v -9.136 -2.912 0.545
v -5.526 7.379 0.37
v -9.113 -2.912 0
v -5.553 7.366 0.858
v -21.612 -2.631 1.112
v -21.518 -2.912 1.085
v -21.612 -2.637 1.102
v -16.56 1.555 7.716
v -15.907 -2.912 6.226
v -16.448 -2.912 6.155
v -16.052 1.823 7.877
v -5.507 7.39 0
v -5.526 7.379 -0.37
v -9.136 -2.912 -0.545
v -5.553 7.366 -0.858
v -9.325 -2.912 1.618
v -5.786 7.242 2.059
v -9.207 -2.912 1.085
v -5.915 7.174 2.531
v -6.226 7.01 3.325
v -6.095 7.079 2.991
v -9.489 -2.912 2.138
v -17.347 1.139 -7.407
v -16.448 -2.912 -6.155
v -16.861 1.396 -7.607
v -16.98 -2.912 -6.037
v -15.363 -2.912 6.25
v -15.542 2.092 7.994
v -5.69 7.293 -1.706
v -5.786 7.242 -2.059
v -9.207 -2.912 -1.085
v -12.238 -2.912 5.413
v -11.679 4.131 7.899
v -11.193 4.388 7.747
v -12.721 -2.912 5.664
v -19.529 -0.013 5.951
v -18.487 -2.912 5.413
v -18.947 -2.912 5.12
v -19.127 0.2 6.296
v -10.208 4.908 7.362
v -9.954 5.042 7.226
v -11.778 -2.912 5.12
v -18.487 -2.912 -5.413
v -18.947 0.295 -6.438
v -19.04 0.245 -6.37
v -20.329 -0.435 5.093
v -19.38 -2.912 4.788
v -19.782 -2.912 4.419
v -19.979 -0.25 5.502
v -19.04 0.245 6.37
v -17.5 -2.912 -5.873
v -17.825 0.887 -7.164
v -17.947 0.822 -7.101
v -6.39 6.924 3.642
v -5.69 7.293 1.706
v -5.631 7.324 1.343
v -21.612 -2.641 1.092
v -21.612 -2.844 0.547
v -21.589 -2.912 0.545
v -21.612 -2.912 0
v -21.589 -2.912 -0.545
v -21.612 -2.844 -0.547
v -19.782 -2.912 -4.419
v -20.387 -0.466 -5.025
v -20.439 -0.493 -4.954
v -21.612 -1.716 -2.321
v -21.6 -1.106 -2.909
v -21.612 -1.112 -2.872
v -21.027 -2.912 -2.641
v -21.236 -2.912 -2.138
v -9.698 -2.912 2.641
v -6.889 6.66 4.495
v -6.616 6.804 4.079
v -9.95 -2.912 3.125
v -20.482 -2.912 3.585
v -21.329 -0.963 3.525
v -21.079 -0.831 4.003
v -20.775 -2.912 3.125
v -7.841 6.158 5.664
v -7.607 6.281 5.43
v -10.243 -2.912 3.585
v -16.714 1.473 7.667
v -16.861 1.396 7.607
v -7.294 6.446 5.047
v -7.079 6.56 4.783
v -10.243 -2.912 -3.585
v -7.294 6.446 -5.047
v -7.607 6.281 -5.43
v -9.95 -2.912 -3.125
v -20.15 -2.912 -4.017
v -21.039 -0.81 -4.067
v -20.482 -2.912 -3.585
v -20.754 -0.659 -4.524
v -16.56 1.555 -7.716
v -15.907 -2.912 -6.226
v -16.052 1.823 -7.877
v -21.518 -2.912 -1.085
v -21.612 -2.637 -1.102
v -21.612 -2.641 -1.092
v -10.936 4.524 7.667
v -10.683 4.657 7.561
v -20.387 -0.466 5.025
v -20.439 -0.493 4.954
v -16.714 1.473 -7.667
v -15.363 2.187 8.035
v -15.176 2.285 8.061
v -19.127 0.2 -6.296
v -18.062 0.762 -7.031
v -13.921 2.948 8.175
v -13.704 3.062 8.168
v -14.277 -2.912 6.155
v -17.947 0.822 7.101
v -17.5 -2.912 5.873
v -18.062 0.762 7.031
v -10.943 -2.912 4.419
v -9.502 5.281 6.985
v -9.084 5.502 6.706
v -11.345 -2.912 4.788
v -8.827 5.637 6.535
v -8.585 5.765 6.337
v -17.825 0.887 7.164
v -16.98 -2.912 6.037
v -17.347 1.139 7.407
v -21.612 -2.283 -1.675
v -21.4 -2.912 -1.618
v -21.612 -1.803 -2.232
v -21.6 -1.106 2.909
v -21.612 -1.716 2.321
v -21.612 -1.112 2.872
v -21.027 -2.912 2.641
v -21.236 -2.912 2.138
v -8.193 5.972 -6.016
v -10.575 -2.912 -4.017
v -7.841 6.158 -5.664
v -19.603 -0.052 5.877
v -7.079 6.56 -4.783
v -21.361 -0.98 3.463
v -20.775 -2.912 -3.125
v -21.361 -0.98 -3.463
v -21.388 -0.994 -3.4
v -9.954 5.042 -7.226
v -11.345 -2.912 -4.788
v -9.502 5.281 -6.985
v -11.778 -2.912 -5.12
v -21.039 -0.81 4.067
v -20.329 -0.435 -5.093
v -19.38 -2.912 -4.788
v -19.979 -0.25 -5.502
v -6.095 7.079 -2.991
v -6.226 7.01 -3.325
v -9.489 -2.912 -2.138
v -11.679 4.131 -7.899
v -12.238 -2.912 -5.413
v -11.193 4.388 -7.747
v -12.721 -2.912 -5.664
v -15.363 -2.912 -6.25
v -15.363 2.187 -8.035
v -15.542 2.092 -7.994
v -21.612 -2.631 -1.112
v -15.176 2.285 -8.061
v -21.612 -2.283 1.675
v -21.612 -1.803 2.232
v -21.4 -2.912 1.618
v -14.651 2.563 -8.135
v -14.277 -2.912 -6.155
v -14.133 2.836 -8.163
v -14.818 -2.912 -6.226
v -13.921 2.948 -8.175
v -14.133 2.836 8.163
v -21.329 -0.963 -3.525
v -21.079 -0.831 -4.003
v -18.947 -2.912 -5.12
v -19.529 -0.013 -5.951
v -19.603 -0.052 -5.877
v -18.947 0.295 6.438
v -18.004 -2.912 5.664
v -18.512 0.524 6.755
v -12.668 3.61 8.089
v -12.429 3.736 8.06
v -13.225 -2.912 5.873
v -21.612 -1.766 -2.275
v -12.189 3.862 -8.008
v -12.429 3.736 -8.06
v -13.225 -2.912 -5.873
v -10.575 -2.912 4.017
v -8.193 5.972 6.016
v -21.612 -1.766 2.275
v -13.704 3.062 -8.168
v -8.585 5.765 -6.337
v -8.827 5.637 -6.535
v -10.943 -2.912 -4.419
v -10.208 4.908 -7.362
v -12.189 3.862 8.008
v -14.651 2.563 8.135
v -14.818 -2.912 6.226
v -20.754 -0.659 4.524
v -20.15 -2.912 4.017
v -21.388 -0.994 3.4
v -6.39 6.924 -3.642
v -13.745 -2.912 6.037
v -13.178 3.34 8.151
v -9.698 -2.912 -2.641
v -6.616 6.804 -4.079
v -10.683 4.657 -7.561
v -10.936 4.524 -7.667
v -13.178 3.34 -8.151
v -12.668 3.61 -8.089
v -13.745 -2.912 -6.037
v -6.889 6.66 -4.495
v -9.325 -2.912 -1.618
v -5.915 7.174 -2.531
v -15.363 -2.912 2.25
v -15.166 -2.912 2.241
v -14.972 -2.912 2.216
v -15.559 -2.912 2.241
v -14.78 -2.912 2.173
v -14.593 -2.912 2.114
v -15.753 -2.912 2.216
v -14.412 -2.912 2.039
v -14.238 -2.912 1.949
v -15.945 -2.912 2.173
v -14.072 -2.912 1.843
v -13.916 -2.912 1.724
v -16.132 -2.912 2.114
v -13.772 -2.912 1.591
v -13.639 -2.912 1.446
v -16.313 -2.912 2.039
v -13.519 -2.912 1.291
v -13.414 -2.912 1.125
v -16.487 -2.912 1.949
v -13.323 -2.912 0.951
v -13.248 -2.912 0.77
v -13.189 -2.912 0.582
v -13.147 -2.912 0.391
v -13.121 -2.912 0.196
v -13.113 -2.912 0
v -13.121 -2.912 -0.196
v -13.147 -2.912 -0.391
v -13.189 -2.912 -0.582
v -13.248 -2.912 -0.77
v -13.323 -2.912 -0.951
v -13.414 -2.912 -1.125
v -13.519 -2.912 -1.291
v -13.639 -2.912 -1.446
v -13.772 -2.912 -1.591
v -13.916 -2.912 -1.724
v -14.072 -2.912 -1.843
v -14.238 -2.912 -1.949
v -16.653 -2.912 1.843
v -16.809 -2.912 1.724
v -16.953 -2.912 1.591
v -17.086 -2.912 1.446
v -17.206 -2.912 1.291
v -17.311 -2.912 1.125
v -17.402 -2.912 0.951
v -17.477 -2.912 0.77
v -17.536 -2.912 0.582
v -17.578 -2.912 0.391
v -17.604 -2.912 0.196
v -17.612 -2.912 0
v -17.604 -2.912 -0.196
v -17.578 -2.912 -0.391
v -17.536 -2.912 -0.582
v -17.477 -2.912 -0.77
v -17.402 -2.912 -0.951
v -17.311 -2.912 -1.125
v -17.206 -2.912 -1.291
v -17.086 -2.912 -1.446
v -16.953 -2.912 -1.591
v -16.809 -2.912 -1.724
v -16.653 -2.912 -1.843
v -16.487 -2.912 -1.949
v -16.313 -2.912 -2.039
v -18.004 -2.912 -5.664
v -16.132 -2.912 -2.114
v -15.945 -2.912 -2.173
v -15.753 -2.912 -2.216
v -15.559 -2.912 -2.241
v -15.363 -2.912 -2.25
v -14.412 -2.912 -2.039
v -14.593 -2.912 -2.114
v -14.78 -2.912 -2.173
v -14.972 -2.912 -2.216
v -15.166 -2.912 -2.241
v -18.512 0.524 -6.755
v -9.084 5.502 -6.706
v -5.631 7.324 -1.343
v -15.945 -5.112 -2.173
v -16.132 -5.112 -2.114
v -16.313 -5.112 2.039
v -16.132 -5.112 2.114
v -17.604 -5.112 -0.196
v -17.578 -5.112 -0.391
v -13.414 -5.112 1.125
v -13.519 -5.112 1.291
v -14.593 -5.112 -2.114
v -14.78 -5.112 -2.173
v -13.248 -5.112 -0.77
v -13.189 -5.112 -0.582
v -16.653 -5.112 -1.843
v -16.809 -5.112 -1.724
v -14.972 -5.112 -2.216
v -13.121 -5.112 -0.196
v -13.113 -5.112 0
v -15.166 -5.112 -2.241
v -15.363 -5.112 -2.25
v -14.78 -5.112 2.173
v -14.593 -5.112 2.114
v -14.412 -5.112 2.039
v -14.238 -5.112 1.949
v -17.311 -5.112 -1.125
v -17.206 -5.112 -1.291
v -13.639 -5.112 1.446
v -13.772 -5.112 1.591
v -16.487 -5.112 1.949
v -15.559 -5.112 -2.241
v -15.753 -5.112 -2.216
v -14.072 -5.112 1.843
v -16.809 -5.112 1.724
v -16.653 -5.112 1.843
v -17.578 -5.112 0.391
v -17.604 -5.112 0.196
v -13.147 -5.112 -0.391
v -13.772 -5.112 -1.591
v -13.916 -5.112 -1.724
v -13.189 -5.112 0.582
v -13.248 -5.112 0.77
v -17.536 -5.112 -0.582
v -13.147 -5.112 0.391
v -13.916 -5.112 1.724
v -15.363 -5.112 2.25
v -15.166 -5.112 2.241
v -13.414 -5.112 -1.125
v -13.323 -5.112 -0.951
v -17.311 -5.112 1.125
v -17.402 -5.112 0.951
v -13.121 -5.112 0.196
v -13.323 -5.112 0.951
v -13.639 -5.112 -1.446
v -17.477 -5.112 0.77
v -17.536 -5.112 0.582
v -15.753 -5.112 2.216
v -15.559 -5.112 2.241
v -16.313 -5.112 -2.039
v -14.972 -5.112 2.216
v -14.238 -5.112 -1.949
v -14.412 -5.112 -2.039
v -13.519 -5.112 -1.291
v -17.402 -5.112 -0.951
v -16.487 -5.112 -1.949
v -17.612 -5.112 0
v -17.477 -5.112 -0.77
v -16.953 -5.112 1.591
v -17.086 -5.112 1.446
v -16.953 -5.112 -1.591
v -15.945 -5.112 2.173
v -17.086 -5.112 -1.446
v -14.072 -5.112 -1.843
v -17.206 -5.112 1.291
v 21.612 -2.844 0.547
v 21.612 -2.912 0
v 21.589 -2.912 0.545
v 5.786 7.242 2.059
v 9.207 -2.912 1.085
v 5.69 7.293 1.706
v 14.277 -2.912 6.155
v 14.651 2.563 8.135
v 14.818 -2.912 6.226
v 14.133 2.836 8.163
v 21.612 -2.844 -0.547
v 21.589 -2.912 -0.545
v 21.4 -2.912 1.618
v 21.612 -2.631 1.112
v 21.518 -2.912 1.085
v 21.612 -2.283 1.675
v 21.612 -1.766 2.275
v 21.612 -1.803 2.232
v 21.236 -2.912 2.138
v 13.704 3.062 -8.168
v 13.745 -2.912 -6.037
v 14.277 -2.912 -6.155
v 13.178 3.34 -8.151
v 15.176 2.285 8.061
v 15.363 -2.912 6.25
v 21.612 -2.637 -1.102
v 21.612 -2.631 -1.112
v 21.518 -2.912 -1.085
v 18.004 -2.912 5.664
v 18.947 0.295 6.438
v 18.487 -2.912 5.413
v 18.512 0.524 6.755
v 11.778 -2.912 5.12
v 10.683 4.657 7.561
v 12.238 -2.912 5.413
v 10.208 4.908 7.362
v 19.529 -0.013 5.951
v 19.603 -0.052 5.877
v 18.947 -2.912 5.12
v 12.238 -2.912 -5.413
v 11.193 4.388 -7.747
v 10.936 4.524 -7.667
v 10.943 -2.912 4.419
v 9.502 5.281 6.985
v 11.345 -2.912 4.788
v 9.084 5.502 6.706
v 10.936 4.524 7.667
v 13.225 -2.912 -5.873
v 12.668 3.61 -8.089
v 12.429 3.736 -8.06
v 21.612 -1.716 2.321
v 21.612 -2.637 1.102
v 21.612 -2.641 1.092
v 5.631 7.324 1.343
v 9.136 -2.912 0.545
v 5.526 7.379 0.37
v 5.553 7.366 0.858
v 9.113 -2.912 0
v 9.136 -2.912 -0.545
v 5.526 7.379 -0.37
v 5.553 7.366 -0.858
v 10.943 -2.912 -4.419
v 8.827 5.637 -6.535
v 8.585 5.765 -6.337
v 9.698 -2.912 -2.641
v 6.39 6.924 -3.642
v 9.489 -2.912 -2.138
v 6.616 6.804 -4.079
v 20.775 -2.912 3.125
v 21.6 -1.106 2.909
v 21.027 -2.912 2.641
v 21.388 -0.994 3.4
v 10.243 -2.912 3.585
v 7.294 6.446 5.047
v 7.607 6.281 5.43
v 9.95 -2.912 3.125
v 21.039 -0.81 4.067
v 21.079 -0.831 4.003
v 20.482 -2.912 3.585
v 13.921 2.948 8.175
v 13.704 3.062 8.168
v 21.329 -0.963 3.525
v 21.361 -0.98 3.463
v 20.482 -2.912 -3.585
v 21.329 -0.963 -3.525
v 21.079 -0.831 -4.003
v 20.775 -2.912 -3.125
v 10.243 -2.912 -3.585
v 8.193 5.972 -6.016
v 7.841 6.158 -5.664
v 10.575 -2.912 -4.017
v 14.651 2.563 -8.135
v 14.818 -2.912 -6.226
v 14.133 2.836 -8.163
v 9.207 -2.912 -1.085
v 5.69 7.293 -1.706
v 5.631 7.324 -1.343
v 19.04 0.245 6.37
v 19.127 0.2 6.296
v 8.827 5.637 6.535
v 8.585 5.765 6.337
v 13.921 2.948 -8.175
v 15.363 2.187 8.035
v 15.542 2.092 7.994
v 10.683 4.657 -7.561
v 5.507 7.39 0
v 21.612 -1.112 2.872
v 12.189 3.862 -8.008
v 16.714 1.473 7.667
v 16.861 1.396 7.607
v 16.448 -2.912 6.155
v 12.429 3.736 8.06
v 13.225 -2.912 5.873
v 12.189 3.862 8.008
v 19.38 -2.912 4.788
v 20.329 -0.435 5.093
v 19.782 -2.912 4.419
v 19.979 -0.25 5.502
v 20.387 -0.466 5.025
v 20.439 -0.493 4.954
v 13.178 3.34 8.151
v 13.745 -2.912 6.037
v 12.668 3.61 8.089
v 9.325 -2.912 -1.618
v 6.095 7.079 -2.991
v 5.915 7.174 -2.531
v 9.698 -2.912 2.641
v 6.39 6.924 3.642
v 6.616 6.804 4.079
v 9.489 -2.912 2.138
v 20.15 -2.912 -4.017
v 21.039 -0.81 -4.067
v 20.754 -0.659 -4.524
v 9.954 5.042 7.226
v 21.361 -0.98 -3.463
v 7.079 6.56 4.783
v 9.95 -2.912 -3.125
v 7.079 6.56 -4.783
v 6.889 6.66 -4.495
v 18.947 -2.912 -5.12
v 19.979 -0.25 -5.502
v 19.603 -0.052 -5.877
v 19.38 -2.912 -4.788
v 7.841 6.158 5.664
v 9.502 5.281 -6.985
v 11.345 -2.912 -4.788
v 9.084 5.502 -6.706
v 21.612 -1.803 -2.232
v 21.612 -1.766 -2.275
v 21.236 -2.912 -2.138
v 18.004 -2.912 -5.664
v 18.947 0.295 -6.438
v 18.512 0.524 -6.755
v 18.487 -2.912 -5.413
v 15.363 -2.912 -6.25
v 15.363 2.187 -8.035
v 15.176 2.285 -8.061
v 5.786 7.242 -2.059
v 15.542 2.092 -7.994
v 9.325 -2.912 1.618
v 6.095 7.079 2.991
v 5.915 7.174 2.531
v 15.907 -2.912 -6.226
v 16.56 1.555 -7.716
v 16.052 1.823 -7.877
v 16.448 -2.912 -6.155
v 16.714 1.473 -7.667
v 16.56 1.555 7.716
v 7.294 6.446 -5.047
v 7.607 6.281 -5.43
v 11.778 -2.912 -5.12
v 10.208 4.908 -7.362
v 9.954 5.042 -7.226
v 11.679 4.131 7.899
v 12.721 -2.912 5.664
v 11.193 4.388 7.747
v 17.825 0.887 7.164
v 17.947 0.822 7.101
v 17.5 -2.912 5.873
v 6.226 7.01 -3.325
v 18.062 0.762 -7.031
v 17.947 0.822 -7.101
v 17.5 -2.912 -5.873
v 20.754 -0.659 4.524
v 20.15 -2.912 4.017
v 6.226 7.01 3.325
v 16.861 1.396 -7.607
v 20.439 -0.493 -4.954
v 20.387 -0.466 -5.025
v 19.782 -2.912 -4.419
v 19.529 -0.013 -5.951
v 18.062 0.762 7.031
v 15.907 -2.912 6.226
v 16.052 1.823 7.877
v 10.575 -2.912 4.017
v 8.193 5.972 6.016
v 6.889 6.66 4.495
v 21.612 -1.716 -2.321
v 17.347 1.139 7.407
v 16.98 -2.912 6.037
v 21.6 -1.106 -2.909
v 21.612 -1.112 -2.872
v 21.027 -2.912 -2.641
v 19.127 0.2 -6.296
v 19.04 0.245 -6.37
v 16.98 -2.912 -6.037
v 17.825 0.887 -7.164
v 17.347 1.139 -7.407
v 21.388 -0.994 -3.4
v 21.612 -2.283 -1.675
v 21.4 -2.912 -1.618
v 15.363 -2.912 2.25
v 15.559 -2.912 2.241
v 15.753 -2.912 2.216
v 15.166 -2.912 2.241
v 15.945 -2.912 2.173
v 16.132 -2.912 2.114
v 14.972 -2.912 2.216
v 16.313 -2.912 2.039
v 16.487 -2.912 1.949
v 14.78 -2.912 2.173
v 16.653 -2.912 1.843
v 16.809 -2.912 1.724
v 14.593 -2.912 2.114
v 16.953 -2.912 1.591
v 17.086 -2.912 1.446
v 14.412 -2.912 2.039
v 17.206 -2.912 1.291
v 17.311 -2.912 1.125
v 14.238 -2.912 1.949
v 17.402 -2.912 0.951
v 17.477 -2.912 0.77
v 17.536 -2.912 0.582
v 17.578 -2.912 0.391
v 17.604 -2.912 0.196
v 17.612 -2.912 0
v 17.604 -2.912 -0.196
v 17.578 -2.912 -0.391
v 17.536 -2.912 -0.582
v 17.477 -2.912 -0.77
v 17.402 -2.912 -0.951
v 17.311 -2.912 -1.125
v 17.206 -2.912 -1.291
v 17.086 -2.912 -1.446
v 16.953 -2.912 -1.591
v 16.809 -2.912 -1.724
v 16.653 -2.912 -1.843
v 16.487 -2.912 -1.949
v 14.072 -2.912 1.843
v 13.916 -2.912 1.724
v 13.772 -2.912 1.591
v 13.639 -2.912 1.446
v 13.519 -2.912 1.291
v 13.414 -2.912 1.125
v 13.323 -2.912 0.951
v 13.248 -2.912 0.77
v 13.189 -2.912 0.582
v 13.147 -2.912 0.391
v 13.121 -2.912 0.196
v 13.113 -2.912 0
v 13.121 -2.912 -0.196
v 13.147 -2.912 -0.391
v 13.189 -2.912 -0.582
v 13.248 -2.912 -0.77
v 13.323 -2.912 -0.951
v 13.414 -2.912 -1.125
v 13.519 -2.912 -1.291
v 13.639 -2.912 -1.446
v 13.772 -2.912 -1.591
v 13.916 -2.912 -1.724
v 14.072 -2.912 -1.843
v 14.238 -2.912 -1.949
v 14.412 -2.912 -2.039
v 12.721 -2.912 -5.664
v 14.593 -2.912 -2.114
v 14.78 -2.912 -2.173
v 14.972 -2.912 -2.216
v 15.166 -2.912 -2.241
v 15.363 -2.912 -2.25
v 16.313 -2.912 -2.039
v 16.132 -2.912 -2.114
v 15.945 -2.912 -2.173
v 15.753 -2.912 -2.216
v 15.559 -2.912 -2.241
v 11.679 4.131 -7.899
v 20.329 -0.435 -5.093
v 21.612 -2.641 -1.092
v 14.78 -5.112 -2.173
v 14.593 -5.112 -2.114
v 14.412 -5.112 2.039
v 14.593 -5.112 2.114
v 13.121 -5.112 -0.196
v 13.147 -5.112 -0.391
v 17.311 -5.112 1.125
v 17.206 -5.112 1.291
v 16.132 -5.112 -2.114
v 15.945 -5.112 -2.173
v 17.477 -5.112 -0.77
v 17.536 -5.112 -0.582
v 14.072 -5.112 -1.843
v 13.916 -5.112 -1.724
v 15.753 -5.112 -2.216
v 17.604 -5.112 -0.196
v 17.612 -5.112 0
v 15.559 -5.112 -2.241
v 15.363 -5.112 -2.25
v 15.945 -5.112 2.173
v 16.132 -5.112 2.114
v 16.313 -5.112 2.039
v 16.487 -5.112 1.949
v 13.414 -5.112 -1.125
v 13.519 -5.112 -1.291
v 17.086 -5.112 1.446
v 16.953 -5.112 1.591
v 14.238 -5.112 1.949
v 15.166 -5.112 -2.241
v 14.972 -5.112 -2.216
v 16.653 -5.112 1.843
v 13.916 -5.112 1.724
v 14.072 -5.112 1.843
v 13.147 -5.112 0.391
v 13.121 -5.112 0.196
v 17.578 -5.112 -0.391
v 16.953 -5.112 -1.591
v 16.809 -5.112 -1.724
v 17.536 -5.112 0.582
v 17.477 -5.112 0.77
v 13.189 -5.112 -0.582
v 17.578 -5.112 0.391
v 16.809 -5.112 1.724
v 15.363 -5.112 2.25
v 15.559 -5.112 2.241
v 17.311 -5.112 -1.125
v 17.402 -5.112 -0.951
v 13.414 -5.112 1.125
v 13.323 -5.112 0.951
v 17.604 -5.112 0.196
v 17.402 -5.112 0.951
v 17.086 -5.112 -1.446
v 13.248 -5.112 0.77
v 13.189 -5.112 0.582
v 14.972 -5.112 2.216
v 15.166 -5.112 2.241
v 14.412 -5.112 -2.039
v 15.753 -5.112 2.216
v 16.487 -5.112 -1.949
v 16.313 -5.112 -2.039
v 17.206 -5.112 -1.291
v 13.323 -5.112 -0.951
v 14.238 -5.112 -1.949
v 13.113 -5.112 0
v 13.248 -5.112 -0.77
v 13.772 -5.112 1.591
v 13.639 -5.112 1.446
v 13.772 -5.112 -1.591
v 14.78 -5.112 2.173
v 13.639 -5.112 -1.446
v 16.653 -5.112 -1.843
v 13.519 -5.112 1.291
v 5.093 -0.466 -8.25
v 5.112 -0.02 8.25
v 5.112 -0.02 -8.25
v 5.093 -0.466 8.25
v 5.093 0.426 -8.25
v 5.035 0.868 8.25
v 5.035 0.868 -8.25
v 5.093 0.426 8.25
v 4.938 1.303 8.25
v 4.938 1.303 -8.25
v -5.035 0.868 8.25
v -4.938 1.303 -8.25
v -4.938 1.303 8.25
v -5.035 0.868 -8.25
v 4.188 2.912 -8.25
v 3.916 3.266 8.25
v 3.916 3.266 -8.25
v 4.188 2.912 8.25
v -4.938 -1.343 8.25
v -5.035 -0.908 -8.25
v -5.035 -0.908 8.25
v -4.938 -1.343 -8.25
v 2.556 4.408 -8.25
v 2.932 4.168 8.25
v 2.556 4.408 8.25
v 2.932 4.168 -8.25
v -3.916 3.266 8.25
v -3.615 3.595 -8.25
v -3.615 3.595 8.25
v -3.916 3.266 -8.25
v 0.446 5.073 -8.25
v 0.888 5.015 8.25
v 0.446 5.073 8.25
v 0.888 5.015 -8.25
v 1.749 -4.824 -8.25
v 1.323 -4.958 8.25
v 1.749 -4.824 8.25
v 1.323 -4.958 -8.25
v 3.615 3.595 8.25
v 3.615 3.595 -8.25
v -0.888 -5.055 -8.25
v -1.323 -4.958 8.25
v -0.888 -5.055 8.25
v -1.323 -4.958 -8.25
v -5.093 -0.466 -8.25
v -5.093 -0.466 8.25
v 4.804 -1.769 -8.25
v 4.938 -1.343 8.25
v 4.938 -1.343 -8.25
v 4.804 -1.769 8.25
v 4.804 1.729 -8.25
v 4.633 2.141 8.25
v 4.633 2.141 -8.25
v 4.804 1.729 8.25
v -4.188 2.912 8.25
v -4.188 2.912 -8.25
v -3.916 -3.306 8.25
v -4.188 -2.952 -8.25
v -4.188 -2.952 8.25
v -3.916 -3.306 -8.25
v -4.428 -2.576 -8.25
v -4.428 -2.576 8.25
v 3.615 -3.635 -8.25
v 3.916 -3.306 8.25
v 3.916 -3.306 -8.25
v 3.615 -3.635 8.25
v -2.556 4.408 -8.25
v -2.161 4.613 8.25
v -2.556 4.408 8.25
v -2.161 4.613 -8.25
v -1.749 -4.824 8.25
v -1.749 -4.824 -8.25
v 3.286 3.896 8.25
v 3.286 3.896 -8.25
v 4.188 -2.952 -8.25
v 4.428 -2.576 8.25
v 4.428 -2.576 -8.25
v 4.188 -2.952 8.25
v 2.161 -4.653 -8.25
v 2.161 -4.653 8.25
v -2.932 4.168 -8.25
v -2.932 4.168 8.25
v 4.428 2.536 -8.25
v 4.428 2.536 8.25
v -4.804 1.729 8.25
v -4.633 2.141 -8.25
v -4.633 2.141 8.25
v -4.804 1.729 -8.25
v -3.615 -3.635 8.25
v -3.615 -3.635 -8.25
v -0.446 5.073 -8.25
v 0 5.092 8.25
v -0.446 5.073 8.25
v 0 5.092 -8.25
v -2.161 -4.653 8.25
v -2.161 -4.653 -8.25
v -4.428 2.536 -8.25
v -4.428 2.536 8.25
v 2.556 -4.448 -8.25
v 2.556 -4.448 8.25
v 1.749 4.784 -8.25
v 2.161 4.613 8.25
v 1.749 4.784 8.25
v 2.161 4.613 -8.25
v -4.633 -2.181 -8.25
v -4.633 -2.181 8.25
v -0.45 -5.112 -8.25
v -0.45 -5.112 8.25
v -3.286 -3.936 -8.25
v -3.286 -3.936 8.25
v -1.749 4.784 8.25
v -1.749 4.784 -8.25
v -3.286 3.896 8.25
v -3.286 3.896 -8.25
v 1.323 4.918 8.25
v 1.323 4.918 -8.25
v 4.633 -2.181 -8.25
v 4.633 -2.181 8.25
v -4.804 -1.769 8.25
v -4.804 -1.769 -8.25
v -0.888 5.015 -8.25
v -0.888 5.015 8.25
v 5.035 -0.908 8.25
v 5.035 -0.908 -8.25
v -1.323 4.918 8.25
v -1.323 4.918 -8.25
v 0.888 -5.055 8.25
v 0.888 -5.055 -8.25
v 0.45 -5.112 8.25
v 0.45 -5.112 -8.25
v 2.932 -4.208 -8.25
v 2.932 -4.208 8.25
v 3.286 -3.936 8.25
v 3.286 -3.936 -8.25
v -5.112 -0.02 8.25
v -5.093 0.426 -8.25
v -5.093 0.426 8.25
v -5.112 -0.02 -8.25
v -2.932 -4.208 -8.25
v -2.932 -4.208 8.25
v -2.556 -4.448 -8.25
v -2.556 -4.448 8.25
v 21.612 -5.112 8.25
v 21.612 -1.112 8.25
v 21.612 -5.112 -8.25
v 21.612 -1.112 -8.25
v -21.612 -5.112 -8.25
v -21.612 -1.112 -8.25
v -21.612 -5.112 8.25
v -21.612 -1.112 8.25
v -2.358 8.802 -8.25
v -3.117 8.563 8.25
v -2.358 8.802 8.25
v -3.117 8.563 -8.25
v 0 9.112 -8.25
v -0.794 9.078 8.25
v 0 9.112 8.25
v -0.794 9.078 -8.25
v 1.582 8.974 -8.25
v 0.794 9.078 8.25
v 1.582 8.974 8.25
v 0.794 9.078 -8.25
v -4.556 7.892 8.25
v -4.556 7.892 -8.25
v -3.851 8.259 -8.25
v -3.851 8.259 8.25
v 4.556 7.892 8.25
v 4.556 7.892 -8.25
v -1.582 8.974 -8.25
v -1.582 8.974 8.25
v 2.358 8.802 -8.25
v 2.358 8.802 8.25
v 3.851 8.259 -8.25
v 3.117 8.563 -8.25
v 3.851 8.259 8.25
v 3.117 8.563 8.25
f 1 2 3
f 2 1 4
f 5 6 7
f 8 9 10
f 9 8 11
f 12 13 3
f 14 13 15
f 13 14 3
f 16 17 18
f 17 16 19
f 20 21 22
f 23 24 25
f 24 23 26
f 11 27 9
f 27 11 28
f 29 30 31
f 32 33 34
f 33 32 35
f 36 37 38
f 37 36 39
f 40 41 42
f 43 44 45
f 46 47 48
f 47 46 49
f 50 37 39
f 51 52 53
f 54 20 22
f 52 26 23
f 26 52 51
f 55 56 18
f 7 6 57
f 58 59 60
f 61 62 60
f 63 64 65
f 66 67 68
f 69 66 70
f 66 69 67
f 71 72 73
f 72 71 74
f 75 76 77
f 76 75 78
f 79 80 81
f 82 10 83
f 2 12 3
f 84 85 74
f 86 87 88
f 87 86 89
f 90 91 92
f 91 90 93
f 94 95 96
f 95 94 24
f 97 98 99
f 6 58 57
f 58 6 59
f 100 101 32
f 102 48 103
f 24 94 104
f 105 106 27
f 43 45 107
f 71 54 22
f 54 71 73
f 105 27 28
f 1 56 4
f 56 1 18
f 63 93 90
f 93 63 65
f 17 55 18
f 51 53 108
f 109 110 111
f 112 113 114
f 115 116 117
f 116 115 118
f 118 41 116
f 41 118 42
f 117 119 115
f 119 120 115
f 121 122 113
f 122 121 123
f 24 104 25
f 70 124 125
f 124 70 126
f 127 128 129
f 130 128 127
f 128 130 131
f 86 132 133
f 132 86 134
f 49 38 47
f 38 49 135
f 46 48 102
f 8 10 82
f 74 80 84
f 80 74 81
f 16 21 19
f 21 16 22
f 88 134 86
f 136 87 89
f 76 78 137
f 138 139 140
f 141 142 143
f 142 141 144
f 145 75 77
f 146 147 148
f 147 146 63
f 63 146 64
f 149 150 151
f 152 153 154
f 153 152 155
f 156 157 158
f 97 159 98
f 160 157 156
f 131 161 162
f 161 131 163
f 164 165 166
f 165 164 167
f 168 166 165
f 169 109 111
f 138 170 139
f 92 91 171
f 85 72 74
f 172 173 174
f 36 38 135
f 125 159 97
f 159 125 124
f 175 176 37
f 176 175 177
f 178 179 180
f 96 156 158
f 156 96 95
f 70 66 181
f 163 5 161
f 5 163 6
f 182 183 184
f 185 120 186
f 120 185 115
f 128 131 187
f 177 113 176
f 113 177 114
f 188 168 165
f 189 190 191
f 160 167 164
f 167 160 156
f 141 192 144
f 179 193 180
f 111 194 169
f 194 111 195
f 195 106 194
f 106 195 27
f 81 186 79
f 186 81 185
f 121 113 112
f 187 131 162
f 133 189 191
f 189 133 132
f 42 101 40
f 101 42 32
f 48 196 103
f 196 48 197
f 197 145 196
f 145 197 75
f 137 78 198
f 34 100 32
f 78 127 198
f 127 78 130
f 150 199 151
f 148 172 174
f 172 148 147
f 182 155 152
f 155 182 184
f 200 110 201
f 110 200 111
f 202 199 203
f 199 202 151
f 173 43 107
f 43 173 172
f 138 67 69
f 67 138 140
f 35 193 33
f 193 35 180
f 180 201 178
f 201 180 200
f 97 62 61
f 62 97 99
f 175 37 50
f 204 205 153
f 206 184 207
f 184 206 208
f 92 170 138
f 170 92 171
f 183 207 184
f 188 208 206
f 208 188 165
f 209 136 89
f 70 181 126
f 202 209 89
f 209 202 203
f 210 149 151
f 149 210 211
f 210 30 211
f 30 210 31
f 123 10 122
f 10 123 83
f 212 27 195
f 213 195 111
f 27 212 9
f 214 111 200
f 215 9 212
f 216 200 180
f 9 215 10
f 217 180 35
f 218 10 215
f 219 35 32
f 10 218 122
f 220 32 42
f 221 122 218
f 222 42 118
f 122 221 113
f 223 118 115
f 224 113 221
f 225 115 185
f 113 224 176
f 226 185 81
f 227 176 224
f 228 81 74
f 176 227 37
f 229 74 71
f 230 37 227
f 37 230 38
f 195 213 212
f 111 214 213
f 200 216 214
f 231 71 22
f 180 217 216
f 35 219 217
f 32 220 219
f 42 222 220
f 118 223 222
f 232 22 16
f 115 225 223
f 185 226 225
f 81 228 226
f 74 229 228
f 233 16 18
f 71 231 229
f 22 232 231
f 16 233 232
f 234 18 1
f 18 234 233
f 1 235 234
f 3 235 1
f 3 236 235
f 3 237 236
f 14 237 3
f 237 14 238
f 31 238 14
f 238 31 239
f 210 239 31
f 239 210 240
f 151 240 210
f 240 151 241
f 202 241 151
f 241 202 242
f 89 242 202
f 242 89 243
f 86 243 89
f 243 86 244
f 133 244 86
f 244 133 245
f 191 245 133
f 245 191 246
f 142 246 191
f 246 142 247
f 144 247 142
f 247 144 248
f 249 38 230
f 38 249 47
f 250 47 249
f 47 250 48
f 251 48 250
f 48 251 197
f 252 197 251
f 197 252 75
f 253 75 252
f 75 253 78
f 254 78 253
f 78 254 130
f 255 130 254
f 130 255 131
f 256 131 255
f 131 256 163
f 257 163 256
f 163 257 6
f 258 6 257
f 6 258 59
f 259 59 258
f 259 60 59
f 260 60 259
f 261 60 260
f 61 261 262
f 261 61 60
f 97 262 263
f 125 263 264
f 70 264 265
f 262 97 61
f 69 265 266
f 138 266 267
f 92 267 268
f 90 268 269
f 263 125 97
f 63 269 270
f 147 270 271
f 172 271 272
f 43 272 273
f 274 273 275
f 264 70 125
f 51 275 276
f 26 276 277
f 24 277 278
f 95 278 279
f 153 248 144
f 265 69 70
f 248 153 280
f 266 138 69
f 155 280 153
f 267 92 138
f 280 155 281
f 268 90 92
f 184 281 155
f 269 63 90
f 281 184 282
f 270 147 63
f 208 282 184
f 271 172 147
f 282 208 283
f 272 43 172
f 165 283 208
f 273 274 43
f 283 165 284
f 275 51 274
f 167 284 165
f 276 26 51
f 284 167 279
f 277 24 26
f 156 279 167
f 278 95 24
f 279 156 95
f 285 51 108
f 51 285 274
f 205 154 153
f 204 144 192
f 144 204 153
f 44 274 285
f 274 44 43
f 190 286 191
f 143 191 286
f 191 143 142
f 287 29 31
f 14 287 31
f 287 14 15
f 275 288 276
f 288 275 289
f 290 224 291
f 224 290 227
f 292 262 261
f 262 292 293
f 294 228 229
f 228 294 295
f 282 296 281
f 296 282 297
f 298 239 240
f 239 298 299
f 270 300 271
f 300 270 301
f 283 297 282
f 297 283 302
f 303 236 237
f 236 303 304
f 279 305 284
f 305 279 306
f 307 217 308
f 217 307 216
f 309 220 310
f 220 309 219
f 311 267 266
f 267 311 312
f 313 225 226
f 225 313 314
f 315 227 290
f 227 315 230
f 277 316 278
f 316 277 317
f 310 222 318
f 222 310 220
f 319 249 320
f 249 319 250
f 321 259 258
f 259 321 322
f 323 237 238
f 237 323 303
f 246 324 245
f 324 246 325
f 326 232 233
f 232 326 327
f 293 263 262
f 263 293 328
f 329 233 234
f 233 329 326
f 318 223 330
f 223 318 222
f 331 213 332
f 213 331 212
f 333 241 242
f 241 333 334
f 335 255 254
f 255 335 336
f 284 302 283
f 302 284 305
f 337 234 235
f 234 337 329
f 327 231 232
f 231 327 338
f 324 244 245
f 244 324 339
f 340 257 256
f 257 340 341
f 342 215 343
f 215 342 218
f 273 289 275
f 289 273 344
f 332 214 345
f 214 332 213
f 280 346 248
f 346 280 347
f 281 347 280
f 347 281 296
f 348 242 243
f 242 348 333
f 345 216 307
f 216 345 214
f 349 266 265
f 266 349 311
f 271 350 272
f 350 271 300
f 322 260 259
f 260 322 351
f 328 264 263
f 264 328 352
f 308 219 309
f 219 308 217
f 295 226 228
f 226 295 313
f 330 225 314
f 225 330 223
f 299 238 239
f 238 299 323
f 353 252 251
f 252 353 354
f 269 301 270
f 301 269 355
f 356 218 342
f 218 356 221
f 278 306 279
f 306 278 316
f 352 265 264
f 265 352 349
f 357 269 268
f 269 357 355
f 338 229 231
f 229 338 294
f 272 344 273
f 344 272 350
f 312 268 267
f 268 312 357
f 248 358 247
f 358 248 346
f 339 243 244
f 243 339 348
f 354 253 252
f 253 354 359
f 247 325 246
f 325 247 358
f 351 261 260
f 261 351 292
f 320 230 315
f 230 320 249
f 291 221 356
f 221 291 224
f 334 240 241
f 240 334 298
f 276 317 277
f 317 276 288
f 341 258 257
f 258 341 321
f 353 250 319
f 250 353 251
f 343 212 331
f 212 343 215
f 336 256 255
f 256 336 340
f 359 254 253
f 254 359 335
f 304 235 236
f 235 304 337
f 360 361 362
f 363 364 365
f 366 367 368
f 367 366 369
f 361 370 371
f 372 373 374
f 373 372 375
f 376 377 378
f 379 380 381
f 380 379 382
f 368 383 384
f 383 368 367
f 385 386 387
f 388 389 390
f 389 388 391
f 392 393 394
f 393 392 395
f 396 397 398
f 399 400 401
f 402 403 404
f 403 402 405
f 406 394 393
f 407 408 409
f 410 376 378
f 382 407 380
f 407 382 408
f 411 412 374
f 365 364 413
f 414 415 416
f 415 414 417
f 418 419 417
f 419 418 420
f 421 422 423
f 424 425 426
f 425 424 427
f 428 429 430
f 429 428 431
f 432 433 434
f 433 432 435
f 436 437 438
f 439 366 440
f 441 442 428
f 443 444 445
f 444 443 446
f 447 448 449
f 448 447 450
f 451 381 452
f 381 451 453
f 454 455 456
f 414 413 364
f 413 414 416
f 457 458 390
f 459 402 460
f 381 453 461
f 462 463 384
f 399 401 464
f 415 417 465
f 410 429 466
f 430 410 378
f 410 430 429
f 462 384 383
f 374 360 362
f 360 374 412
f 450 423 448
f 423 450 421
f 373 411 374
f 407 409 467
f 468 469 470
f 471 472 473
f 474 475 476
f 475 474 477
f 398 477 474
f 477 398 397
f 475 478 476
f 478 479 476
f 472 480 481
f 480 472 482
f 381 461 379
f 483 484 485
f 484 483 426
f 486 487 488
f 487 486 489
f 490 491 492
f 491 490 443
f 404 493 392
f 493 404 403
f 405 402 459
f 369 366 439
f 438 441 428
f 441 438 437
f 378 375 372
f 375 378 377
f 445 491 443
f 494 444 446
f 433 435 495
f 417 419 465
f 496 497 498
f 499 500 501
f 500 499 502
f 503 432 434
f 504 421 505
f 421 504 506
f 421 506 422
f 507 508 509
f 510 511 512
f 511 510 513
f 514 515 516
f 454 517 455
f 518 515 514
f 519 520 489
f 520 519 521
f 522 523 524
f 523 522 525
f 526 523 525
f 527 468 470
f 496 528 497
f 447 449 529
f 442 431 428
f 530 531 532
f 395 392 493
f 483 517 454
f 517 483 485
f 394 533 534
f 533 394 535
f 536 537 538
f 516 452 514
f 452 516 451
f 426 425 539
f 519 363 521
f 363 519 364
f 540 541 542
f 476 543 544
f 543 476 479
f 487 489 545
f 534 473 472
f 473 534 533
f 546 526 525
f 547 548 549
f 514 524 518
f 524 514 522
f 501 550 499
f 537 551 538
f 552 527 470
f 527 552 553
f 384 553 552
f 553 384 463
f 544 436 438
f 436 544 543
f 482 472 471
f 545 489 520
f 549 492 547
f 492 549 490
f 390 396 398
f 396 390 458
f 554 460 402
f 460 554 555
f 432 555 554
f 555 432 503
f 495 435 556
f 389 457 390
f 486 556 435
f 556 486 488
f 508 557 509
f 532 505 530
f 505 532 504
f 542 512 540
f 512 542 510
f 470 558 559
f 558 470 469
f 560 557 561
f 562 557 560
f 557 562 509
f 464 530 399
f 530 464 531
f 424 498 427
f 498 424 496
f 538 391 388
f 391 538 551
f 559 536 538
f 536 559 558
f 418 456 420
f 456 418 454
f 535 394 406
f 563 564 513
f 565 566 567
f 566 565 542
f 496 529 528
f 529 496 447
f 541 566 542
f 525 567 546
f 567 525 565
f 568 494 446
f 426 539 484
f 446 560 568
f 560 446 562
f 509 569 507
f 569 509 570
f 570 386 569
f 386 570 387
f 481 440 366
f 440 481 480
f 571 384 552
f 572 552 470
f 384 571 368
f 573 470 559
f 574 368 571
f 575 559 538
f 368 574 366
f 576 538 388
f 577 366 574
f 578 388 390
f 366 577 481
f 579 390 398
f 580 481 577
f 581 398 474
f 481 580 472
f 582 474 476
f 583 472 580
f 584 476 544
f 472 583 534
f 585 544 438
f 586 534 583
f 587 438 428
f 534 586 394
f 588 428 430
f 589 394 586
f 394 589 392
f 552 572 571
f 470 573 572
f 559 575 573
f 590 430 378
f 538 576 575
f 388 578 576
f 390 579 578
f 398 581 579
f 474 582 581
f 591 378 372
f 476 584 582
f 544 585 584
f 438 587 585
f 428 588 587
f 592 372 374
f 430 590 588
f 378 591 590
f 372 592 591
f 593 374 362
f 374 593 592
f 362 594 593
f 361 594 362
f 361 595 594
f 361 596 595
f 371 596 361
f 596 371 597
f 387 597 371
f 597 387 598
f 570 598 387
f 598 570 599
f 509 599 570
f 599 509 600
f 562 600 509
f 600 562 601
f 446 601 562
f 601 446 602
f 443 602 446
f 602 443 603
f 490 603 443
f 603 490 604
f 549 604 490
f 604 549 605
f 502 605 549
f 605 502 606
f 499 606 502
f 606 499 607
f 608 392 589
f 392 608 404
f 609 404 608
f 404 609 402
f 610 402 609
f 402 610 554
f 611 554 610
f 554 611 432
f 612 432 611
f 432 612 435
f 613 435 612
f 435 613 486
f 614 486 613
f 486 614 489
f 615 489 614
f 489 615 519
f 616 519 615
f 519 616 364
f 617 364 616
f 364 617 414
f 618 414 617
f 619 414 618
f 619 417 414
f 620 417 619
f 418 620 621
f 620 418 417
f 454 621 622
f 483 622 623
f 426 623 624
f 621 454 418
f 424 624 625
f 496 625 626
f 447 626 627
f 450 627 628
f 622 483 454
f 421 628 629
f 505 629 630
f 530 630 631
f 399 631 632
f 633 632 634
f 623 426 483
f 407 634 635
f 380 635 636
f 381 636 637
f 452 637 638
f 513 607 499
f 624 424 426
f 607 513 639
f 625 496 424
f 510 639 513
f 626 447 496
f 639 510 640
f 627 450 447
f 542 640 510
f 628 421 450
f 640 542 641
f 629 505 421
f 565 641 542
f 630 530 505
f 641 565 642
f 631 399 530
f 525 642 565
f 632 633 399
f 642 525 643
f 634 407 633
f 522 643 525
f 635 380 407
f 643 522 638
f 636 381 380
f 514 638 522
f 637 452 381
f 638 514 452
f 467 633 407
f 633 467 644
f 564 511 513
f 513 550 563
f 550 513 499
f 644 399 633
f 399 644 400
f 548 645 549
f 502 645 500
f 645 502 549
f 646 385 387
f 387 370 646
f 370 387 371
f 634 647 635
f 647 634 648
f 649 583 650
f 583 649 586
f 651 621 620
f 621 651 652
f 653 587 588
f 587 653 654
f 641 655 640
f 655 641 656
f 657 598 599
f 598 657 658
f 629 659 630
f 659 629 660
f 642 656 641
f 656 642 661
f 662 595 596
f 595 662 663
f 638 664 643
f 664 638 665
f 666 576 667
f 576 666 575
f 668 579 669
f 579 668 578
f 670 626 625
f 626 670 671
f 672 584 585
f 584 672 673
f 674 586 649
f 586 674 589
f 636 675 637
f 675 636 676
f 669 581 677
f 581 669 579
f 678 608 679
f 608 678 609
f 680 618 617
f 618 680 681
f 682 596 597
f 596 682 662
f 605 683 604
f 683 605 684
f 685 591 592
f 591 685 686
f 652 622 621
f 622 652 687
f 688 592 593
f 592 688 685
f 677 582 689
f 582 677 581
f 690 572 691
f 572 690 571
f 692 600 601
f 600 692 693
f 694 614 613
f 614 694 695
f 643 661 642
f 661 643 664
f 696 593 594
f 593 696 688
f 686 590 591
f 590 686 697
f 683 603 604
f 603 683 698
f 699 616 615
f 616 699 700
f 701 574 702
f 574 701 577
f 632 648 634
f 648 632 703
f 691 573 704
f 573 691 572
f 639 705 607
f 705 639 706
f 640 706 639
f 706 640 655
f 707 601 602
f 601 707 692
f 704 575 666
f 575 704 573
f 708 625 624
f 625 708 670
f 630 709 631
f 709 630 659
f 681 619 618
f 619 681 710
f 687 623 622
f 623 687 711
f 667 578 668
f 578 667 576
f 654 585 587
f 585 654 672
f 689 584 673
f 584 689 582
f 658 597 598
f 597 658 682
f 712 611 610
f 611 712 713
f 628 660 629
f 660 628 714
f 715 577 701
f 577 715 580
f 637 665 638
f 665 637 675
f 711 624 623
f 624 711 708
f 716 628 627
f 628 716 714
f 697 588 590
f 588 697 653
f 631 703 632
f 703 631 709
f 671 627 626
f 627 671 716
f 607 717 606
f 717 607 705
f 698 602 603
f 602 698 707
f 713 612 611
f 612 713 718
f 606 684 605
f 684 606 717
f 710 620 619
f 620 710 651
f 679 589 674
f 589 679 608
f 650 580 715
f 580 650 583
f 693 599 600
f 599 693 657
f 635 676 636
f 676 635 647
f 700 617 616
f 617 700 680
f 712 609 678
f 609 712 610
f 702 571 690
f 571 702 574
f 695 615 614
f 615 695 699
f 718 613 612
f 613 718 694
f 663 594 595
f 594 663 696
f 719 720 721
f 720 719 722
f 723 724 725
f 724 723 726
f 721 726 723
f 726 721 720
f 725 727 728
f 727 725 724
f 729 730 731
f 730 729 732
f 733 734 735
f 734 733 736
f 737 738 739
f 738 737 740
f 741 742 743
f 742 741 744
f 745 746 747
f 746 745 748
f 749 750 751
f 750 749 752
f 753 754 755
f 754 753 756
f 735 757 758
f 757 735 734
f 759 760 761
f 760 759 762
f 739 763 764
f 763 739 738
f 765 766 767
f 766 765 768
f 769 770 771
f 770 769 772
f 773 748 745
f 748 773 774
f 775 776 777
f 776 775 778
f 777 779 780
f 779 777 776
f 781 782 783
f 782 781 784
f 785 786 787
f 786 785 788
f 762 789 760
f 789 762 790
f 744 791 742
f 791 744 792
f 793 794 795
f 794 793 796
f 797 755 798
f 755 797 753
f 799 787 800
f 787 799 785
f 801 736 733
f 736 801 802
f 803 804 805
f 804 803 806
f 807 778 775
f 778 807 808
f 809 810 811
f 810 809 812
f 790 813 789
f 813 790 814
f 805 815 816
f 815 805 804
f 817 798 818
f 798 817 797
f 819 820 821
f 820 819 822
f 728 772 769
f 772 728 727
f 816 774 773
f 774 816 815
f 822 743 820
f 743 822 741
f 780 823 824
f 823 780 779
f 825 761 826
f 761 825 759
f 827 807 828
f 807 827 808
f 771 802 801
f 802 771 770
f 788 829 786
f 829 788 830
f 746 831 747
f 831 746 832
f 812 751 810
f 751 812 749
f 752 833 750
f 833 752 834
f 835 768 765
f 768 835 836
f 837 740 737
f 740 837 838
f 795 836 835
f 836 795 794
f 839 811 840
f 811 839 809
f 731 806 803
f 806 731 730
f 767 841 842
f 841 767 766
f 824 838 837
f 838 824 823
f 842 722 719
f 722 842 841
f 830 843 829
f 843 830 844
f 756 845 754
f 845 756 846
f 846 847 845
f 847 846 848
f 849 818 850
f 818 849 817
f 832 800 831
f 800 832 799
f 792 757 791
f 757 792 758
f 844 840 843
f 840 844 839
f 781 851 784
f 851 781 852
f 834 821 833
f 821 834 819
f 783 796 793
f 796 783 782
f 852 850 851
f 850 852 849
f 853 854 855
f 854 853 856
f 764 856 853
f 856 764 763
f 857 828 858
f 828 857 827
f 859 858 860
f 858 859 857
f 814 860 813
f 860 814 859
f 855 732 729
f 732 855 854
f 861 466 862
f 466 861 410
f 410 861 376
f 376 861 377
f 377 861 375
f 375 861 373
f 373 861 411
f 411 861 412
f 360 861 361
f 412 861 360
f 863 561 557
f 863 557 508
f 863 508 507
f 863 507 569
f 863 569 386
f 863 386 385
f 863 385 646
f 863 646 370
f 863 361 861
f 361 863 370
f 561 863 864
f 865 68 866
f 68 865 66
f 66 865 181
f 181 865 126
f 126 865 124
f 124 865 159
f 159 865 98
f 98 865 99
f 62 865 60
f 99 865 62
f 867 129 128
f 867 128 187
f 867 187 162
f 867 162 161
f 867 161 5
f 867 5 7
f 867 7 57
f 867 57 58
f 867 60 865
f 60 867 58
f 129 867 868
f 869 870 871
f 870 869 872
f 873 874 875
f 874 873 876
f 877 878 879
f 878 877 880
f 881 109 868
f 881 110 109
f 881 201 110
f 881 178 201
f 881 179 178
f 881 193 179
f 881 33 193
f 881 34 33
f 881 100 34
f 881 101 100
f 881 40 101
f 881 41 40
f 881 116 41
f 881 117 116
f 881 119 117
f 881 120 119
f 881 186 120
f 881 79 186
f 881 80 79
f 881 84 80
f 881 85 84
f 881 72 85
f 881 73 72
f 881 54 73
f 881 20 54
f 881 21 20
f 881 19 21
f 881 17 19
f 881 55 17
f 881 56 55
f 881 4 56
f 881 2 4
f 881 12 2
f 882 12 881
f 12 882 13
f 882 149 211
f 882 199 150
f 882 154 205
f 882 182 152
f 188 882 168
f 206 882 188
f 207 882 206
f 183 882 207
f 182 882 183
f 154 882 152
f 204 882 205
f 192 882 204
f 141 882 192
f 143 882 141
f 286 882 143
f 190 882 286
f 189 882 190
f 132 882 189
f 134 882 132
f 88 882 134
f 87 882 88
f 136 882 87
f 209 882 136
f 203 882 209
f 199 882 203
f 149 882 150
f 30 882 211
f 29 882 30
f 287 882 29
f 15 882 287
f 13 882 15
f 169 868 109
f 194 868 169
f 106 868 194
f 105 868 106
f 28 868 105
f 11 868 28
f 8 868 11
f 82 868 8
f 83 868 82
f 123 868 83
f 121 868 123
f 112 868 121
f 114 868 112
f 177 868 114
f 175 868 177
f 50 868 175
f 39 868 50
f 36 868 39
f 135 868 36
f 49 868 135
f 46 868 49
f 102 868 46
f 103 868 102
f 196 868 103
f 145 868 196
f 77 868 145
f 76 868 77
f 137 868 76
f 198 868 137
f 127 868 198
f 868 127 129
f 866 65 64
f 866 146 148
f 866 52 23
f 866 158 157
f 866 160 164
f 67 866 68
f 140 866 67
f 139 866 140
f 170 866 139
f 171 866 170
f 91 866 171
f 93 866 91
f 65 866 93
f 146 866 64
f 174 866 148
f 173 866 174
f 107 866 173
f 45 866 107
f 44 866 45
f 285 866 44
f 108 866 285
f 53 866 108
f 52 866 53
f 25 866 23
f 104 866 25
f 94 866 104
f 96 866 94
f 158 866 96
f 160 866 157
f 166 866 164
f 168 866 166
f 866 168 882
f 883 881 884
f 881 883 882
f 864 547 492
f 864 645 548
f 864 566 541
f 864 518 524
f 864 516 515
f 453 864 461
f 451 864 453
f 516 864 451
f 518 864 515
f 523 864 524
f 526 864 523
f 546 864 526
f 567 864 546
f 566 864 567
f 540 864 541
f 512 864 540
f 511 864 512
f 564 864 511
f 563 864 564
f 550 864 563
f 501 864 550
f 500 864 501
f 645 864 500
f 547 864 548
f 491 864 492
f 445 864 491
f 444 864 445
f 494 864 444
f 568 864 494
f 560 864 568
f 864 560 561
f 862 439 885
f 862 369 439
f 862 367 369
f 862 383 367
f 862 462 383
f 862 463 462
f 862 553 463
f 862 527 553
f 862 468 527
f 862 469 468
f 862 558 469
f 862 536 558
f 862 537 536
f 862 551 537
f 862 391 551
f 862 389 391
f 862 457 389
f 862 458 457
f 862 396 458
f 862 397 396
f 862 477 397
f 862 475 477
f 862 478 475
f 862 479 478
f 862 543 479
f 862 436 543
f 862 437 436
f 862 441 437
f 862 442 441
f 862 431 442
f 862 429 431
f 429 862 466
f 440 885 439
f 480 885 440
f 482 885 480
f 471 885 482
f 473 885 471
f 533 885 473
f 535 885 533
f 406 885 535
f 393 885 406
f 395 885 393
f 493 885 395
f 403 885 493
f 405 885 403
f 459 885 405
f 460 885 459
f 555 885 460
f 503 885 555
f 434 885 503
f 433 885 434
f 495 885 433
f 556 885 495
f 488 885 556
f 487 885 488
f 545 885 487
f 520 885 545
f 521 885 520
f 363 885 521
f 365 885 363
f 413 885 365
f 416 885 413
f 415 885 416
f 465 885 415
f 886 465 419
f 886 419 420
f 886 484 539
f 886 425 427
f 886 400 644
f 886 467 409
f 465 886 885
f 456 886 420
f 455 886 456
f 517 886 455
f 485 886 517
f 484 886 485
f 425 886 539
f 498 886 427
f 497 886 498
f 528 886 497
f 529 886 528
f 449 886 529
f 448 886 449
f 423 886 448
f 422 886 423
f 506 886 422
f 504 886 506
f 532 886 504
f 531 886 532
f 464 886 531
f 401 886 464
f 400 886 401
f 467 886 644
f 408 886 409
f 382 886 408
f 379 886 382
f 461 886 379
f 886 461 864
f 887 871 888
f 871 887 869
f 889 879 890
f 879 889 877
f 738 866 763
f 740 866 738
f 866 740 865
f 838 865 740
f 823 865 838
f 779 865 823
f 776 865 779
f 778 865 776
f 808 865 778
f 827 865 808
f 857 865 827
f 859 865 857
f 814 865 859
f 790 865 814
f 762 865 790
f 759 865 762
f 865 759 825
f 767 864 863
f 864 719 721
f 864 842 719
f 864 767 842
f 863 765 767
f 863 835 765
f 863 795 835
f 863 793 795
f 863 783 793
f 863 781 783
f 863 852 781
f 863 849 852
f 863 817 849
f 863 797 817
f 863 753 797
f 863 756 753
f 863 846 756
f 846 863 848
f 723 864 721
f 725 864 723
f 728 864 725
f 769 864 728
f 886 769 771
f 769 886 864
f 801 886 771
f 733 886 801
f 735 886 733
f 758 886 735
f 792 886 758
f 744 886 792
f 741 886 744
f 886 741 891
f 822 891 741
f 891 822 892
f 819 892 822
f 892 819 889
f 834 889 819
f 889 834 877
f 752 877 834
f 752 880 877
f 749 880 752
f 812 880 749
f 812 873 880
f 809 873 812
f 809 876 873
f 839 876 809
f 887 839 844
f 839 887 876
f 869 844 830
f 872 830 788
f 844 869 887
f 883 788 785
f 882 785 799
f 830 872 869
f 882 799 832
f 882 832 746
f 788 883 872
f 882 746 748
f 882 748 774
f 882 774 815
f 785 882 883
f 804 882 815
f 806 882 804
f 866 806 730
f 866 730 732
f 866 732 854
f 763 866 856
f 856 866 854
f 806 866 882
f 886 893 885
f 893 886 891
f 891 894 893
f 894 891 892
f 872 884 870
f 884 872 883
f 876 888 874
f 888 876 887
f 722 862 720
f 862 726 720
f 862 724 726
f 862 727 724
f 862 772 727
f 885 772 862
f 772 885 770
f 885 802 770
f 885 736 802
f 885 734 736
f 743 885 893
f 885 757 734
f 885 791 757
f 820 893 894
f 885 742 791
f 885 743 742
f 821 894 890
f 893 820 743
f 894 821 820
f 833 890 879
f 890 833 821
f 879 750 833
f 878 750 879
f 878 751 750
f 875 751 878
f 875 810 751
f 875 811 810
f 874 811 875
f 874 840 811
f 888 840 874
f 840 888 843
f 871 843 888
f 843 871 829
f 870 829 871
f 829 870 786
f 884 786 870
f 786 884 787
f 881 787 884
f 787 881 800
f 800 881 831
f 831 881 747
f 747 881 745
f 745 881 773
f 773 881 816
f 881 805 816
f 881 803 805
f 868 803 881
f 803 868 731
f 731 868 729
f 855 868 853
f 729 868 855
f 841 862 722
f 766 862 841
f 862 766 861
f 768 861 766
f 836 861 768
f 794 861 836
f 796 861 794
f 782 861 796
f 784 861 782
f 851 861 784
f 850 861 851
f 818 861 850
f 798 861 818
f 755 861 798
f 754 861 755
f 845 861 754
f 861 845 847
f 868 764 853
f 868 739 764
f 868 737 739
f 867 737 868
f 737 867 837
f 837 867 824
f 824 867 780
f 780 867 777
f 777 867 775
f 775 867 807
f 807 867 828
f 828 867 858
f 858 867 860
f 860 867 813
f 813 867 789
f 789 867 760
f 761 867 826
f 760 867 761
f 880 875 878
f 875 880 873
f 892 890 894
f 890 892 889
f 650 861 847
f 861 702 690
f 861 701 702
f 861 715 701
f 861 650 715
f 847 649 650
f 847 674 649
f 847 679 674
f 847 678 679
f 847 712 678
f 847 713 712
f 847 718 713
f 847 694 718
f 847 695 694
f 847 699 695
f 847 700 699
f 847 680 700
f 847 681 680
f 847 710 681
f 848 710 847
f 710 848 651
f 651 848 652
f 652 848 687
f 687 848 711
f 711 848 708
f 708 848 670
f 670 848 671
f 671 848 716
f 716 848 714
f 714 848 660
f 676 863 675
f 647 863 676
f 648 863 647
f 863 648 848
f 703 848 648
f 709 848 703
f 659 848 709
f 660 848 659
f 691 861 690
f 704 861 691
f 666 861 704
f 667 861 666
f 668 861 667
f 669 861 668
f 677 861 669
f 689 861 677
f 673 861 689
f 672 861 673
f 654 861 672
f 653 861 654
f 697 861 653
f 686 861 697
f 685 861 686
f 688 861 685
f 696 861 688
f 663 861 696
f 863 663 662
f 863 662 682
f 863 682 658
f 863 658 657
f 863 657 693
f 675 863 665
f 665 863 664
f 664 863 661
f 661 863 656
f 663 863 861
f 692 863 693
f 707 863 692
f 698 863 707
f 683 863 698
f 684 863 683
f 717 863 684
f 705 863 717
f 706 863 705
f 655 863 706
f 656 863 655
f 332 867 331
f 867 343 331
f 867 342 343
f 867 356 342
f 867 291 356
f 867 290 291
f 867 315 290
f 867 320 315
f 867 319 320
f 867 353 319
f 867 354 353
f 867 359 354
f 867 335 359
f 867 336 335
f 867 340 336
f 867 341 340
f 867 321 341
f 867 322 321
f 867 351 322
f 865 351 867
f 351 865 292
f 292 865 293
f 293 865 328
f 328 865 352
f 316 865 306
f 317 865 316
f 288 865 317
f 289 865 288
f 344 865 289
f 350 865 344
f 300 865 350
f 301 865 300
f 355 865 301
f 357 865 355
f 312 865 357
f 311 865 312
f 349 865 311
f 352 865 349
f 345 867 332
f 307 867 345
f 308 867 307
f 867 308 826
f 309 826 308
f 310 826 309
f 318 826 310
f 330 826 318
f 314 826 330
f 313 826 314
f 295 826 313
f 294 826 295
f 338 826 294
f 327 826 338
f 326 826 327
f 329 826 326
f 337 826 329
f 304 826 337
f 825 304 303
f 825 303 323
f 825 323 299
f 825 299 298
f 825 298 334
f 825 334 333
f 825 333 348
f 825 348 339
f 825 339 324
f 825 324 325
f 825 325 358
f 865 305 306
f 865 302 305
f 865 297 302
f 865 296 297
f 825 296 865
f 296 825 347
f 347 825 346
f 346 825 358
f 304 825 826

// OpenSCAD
// file: layla_config.scad
// Main parameters used for most Layla parts
$fa=15;
$fs=0.1;

// This number avoids roundoff problems
epsilon=0.02;

// This is how much your printer squishes extra around holes
//   bigger value leaves more space for globs.
clearance=0.3;

// Removeable parts leave this much extra diameter
wiggle=0.1;

// Wall thickness for most parts--two nozzle diameters typ.
wall=0.8;

// Floor thickness--at least 4 layers
floor=1.2;


// This is the main drive axle
axle_dia=0.375*25.4+2*clearance+wiggle;

// Main frame tubing
tube_OD=23.5+2*clearance;


// Main woodscrews: Everbilt #8x9/16" lath screws
woodscrew_head_dia=12.5;
woodscrew_shaft_OD=4.5;
woodscrew_shaft_ID=3.0;
woodscrew_shaft_len=20.0;
woodscrew_boss=1.0; // extra thickness under screw head

// Clearance for woodscrew to pass through (minus)
module woodscrew_head(head_clear_scale=1.0) 
{
    head_clear=0.5*floor+epsilon+head_clear_scale*10;
    translate([0,0,woodscrew_boss]) {
        // Head clearance
        cylinder(d1=woodscrew_head_dia,d2=woodscrew_head_dia+0.7*head_clear,h=head_clear);
        
        // Through clearance for shaft of screw
        translate([0,0,+epsilon])
        scale([1,1,-1])
            cylinder(d=woodscrew_shaft_OD,h=woodscrew_shaft_len);
    }
}

// Raised area reinforcing woodscrew (plus)
module woodscrew_boss()
{
    boss_ht=1.5*floor+woodscrew_boss;
    translate([0,0,-floor])
        cylinder(d1=woodscrew_head_dia*1.8,d2=woodscrew_head_dia*1.3,h=boss_ht);
}

/*
difference() {
    woodscrew_boss();
    woodscrew_head();
}
*/
// main file
include <layla_config.scad>;
$fs=0.1; $fa=5;

// Distance outside axle for reinforcing
thickwall=4.0;

thick=woodscrew_head_dia+thickwall; // Z thickness of bracket
wide=axle_dia+2*thickwall+2*woodscrew_head_dia; // X length of bracket
high=axle_dia+thickwall; // Y height of bracket

// Put in axle mounting screw hole locations
module axle_holes() {
    translate([0,-axle_dia/2+floor,0])
    rotate([-90,0,0])
    for (side=[-1,+1])
        translate([side*(wide/2-woodscrew_head_dia/2),0,0])
            children();
}

// Build bracket to hold axle to wood frame
module axle_bracket()
{
    intersection() {
difference() {
    union() { // plus
        hull() {
            translate([-wide/2,-axle_dia/2,-thick/2])
                cube([wide,thickwall,thick]);
            cylinder(d=axle_dia+2*thickwall,h=thick,center=true);
        }
        // axle_holes() woodscrew_boss();
    }
    union() { // minus
        // space for axle
        translate([0,-epsilon,0])
        cylinder(d=axle_dia,h=2*thick,center=true);
        
        // space for axle mounting holes
        axle_holes() woodscrew_head(10.0);
    }
}
    // Trim all parts to lie inside bounding box:
    translate([-wide/2,-axle_dia/2,-thick/2])
        cube([wide,high,thick]);
    
    }
}

axle_bracket();
